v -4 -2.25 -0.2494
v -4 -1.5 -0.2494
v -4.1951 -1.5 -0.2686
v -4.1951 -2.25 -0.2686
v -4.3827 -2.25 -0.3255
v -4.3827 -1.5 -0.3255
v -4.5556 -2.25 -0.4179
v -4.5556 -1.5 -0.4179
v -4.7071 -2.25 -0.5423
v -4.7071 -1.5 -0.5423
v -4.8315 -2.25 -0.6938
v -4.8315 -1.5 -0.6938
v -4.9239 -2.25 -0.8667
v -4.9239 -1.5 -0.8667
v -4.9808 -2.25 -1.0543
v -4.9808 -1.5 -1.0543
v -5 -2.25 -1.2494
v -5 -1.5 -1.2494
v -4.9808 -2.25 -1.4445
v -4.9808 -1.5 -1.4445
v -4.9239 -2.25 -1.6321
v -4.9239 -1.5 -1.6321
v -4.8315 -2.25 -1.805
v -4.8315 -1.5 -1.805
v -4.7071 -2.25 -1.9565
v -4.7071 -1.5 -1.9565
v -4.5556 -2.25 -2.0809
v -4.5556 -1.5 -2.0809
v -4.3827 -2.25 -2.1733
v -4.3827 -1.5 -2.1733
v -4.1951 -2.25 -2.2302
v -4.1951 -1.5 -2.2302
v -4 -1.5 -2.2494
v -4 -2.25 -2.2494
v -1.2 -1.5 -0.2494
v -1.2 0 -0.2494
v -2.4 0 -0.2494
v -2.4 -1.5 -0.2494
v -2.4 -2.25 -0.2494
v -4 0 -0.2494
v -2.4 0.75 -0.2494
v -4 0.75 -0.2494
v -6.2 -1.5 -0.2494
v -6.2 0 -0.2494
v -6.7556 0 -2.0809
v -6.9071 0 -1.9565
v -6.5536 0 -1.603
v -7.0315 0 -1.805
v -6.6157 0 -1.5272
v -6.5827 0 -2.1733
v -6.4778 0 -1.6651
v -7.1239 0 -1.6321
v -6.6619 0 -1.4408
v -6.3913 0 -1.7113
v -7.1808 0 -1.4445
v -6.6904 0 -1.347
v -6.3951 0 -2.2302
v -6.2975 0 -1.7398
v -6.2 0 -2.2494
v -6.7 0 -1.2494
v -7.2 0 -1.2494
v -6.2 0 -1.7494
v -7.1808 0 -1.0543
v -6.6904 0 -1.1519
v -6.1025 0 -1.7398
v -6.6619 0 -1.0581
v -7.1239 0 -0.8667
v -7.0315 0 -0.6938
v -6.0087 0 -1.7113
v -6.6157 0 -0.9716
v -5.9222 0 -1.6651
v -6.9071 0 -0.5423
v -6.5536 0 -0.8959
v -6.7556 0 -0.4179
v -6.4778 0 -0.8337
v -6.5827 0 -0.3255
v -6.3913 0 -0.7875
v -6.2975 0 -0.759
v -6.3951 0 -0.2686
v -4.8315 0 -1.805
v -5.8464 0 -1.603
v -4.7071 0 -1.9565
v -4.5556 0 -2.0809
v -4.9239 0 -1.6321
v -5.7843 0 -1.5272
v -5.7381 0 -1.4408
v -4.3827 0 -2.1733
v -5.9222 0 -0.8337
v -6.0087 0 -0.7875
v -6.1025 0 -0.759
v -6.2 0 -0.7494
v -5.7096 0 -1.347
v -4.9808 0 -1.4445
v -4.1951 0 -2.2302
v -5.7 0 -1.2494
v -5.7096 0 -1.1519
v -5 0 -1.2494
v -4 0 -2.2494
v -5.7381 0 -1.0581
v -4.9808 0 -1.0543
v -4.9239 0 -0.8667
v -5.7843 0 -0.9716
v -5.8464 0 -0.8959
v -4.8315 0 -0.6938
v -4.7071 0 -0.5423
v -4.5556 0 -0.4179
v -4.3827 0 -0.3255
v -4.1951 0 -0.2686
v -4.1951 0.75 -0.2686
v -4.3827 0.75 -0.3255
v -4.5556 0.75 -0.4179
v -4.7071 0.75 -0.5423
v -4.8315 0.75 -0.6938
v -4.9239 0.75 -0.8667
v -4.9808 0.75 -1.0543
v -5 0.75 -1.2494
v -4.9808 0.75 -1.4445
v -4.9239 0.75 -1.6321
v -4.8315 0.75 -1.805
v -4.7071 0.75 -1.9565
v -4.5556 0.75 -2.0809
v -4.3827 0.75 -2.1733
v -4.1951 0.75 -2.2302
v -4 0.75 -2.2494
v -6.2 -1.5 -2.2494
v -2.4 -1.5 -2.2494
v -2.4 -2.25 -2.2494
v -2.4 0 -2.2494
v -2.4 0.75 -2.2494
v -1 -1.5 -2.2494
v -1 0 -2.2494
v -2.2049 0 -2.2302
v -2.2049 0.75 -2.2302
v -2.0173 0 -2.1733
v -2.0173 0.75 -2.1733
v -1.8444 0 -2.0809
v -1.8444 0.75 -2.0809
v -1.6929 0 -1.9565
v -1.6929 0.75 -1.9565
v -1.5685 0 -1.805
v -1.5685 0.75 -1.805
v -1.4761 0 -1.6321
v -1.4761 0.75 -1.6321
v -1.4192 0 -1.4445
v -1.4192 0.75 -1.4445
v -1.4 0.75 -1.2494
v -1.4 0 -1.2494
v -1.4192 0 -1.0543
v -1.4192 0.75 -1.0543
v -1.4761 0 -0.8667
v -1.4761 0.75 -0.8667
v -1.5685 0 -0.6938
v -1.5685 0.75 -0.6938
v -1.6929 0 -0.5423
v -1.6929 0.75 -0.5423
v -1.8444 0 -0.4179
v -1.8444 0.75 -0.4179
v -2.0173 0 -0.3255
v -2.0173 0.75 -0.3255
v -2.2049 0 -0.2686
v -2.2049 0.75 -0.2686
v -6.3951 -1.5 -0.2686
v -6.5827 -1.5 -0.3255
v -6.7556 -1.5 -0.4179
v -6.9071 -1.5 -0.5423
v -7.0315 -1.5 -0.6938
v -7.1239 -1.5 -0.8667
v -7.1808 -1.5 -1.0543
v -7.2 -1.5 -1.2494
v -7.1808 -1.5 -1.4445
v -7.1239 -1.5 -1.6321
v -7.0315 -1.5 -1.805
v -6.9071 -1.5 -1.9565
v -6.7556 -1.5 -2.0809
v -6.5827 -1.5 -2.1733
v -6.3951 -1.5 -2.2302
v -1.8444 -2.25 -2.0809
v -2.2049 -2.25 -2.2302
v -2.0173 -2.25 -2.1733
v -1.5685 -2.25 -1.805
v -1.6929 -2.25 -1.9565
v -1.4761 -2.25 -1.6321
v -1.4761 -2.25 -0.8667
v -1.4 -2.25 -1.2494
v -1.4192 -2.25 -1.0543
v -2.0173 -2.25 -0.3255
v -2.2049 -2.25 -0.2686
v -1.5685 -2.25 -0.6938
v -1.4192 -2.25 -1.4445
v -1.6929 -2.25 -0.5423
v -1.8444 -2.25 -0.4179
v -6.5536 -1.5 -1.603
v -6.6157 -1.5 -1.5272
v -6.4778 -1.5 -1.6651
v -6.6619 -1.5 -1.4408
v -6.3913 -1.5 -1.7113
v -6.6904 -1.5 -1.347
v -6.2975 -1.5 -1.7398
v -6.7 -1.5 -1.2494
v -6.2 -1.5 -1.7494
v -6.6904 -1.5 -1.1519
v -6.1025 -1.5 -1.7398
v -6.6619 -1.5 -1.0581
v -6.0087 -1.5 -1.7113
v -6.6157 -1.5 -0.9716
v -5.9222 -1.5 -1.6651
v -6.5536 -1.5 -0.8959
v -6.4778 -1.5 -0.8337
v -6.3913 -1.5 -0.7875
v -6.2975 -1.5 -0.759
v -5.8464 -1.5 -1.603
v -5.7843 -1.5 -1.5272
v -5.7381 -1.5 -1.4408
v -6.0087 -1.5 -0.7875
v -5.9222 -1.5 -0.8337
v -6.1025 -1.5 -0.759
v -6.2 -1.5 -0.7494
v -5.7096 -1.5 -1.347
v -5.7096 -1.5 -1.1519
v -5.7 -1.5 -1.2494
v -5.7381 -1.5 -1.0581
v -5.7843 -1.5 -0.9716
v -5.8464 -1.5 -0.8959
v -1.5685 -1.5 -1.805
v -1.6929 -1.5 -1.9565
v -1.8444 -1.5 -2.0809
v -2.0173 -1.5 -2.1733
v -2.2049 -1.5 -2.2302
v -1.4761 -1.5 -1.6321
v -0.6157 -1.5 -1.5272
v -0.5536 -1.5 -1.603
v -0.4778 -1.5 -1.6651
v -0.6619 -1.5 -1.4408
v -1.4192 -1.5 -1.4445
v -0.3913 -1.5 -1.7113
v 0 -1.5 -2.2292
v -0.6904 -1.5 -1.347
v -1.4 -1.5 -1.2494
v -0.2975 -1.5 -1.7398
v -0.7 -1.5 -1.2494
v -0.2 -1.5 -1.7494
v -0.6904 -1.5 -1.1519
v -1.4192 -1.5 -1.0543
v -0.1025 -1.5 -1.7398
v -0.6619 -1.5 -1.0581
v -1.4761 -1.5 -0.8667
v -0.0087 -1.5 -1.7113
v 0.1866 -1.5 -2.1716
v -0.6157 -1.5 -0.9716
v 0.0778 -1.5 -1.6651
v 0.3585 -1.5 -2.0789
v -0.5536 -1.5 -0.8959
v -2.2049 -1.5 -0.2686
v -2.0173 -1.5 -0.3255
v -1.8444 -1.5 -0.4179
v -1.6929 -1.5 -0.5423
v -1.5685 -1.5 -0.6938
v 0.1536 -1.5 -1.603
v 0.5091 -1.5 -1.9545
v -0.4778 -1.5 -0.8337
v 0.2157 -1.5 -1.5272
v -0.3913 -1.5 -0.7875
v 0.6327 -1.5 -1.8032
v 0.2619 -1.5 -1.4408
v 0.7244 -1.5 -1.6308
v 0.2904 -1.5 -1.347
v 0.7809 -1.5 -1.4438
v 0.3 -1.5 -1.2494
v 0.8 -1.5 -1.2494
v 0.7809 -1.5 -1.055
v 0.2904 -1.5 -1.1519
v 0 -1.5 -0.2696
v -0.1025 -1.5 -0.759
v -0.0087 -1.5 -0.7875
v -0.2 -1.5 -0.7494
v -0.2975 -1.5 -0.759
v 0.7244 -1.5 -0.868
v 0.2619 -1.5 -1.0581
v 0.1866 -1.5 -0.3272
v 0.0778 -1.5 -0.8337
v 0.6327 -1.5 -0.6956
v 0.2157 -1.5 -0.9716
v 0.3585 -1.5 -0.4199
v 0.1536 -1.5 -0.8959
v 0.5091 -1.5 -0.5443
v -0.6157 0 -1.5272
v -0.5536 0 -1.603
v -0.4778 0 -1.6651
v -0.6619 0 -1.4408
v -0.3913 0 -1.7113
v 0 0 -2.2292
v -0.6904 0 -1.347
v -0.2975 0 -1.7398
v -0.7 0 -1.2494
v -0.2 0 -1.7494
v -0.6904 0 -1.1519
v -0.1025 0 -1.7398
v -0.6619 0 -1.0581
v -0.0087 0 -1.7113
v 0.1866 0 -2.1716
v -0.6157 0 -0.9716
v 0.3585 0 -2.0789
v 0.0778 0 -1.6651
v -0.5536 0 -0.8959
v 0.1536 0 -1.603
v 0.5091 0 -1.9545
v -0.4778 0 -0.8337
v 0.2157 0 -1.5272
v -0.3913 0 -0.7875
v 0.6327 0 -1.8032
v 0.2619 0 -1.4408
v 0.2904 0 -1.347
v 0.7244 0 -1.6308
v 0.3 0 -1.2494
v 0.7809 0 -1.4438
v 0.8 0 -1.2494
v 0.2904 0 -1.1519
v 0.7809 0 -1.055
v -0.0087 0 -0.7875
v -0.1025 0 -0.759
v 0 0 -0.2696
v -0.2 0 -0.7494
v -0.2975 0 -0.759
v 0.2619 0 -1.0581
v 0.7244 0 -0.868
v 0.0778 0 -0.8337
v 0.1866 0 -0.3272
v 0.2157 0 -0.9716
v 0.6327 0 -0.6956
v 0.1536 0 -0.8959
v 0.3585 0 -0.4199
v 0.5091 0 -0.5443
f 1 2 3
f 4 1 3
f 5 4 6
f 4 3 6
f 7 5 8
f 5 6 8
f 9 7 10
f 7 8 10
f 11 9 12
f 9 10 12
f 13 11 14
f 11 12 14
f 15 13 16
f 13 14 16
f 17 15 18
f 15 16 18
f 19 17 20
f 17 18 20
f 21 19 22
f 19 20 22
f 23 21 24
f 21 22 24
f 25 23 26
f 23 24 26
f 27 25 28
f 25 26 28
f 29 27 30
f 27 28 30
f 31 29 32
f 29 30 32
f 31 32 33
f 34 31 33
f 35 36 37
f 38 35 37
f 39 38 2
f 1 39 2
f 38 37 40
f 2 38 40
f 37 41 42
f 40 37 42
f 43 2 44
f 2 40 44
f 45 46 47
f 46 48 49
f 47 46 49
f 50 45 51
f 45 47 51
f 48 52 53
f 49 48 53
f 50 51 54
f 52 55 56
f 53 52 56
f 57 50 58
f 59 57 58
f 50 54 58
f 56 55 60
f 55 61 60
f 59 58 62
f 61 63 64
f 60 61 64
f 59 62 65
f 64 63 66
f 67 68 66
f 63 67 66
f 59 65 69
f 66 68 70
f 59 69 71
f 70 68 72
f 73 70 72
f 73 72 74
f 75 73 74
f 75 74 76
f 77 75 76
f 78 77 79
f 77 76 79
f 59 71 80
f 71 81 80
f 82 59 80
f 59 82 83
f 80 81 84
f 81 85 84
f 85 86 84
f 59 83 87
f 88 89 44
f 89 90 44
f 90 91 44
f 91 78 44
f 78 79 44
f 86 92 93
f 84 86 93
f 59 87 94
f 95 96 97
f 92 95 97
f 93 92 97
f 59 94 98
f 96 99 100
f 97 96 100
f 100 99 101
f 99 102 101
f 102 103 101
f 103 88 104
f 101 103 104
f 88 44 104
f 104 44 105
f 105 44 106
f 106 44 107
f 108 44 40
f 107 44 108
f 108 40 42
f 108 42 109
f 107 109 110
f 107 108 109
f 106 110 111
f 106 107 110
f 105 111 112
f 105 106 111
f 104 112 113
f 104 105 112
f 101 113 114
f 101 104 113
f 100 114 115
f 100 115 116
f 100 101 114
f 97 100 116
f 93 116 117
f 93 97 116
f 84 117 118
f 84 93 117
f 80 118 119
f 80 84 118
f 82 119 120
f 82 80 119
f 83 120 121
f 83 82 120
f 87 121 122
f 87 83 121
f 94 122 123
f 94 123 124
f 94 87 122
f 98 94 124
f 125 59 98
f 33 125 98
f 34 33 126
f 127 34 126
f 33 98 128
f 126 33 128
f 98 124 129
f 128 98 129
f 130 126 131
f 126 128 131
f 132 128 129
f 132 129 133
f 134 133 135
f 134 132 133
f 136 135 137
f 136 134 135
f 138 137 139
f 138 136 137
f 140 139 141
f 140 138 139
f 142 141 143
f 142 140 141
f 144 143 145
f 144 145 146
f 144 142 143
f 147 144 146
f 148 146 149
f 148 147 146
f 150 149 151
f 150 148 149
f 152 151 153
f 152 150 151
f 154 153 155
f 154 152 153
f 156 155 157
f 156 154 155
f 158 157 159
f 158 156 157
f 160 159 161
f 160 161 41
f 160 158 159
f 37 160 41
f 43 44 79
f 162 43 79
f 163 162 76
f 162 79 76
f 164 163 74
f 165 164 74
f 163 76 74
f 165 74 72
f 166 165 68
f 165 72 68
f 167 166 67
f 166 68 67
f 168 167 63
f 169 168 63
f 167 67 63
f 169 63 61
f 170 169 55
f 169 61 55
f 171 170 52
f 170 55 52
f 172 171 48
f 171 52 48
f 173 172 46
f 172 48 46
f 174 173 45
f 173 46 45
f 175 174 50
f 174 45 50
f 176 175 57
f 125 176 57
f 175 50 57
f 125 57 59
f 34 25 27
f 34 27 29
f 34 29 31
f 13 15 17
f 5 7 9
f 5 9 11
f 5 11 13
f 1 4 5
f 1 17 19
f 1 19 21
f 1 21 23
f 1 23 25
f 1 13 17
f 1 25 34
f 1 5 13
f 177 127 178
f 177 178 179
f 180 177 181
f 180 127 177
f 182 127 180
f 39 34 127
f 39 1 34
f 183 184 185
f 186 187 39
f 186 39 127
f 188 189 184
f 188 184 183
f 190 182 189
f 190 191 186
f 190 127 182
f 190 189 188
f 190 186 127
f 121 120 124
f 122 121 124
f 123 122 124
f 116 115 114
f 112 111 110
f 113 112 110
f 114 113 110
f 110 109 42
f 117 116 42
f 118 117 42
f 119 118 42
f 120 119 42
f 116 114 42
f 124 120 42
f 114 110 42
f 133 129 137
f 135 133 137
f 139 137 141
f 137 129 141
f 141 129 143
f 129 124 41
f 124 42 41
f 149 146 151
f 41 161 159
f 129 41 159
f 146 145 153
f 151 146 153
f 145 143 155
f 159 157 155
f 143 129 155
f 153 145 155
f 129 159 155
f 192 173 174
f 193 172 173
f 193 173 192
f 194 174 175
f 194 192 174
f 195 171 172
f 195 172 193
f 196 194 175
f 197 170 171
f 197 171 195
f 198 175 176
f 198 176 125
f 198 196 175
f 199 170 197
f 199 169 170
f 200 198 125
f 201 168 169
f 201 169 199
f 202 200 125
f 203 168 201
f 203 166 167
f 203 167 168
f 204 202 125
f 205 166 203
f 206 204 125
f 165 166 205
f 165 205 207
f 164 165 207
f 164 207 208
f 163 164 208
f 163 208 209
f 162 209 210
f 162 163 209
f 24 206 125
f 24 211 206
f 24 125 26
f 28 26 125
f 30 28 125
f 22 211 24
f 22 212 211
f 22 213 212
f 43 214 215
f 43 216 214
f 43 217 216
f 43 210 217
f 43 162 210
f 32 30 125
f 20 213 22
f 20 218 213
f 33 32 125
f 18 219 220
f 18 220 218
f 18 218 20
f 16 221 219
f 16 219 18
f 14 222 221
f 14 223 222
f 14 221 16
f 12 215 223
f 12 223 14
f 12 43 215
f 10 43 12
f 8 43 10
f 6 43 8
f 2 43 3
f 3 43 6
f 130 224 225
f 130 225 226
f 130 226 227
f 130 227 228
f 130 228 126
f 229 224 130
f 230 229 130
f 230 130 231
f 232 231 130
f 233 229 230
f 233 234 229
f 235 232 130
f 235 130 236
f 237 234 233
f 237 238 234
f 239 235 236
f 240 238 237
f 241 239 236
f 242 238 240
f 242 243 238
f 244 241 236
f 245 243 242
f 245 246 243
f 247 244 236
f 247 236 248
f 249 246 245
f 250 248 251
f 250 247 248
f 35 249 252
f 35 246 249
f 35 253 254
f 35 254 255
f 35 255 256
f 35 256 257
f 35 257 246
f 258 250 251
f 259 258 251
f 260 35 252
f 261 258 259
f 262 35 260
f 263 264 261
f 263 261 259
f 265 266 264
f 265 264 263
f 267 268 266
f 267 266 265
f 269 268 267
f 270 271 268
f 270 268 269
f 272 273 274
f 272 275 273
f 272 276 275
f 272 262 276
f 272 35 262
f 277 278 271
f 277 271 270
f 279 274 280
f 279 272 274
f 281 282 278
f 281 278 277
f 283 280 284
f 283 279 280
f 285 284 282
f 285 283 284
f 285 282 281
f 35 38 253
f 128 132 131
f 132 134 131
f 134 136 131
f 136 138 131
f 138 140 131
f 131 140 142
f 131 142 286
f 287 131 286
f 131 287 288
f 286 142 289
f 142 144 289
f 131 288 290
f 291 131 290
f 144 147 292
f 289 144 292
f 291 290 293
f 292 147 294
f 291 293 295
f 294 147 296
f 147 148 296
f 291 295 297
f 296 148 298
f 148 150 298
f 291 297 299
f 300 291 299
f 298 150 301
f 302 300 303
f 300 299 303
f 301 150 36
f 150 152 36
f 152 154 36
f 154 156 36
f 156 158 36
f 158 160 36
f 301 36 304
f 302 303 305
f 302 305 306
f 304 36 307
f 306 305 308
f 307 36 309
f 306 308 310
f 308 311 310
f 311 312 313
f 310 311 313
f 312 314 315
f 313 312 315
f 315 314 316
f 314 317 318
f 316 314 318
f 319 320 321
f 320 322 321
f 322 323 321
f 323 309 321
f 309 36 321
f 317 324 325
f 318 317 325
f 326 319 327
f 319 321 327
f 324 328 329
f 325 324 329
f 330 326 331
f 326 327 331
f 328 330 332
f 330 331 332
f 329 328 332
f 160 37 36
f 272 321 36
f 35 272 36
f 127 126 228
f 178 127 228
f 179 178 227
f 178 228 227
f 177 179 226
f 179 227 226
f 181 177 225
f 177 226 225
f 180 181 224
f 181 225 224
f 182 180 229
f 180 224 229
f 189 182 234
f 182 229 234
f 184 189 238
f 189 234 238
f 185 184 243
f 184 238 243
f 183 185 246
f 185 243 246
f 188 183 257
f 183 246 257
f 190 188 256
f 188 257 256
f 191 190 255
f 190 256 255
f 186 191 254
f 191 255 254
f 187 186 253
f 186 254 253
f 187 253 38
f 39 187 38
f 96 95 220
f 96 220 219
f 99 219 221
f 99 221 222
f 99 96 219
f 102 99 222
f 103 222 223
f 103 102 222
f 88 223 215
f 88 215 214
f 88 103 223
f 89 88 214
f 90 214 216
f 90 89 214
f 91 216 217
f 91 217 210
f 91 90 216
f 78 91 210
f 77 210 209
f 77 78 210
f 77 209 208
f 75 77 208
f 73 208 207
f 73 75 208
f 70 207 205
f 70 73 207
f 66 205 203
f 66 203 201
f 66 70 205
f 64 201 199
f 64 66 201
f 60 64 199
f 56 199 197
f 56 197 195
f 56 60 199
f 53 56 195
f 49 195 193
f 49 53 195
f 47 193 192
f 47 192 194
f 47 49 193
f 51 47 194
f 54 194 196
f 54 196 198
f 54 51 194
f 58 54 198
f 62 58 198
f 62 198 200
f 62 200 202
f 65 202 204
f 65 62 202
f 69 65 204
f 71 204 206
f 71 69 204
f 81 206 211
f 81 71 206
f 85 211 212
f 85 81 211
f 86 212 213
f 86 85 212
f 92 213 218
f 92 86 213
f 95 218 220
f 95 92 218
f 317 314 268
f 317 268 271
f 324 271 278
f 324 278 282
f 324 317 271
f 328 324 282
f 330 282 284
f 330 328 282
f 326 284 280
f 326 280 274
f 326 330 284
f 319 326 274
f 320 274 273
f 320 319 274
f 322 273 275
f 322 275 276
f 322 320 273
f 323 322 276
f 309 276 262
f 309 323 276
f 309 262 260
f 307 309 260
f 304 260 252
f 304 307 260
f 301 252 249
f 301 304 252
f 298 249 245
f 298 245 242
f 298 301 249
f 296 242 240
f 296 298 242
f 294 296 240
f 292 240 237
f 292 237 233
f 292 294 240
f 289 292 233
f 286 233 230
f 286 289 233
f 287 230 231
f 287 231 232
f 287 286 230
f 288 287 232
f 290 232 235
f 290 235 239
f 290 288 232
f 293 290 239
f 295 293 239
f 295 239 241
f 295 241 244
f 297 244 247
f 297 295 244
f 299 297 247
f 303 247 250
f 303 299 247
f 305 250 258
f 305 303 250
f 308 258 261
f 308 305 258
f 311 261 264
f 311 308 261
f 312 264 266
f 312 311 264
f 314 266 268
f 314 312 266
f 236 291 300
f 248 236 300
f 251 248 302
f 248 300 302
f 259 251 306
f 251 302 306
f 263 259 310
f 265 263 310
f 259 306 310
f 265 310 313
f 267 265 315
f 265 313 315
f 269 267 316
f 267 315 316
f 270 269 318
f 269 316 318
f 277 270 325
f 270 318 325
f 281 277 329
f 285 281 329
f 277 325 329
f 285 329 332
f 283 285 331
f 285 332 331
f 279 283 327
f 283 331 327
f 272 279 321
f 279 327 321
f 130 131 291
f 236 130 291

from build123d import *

# Parameters (mm, degrees)
F0_R          = 0.5
F1_DEPTH      = 1.5
F2_DEPTH      = 0.75
F2_DEPTH_BACK = 2.25


# Not quite as in the source:
# - a feature names something its author has since deleted; it is built from what else it names


with BuildPart() as f1:
    # F0 (on Front) → F1 (new body)
    with BuildSketch(Plane.XZ):
        with BuildLine():
            ThreePointArc((-2.4, -2.24940907), (-1.4, -1.24940907), (-2.4, -0.24940907))
            Line((-2.4, -0.24940907), (-4, -0.24940907))
            ThreePointArc((-4, -0.24940907), (-5, -1.24940907), (-4, -2.24940907))
            Line((-4, -2.24940907), (-2.4, -2.24940907))
        make_face()
        with BuildLine():
            Line((0, -0.2696131729), (-1.2, -0.24940907))
            Line((-1.2, -0.24940907), (-2.4, -0.24940907))
            ThreePointArc((-2.4, -0.24940907), (-1.4, -1.24940907), (-2.4, -2.24940907))
            Line((-2.4, -2.24940907), (-1, -2.24940907))
            Line((-1, -2.24940907), (0, -2.2292049671))
            ThreePointArc((0, -2.2292049671), (0.8, -1.24940907), (0, -0.2696131729))
        make_face()
        with Locations((-0.2, -1.24940907)):
            Circle(F0_R, mode=Mode.SUBTRACT)
        with BuildLine():
            ThreePointArc((-4, -2.24940907), (-5, -1.24940907), (-4, -0.24940907))
            Line((-4, -0.24940907), (-6.2, -0.24940907))
            ThreePointArc((-6.2, -0.24940907), (-7.2, -1.24940907), (-6.2, -2.24940907))
            Line((-6.2, -2.24940907), (-4, -2.24940907))
        make_face()
        with Locations((-6.2, -1.24940907)):
            Circle(F0_R, mode=Mode.SUBTRACT)
    extrude(amount=F1_DEPTH)

    # F0 (on Front) → F2 (join, two sides)
    with BuildSketch(Plane.XZ) as f2_sk:
        with BuildLine():
            ThreePointArc((-2.4, -2.24940907), (-1.4, -1.24940907), (-2.4, -0.24940907))
            Line((-2.4, -0.24940907), (-4, -0.24940907))
            ThreePointArc((-4, -0.24940907), (-5, -1.24940907), (-4, -2.24940907))
            Line((-4, -2.24940907), (-2.4, -2.24940907))
        make_face()
    extrude(amount=-F2_DEPTH)
    extrude(f2_sk.sketch, amount=F2_DEPTH_BACK)


solid = f1.part
